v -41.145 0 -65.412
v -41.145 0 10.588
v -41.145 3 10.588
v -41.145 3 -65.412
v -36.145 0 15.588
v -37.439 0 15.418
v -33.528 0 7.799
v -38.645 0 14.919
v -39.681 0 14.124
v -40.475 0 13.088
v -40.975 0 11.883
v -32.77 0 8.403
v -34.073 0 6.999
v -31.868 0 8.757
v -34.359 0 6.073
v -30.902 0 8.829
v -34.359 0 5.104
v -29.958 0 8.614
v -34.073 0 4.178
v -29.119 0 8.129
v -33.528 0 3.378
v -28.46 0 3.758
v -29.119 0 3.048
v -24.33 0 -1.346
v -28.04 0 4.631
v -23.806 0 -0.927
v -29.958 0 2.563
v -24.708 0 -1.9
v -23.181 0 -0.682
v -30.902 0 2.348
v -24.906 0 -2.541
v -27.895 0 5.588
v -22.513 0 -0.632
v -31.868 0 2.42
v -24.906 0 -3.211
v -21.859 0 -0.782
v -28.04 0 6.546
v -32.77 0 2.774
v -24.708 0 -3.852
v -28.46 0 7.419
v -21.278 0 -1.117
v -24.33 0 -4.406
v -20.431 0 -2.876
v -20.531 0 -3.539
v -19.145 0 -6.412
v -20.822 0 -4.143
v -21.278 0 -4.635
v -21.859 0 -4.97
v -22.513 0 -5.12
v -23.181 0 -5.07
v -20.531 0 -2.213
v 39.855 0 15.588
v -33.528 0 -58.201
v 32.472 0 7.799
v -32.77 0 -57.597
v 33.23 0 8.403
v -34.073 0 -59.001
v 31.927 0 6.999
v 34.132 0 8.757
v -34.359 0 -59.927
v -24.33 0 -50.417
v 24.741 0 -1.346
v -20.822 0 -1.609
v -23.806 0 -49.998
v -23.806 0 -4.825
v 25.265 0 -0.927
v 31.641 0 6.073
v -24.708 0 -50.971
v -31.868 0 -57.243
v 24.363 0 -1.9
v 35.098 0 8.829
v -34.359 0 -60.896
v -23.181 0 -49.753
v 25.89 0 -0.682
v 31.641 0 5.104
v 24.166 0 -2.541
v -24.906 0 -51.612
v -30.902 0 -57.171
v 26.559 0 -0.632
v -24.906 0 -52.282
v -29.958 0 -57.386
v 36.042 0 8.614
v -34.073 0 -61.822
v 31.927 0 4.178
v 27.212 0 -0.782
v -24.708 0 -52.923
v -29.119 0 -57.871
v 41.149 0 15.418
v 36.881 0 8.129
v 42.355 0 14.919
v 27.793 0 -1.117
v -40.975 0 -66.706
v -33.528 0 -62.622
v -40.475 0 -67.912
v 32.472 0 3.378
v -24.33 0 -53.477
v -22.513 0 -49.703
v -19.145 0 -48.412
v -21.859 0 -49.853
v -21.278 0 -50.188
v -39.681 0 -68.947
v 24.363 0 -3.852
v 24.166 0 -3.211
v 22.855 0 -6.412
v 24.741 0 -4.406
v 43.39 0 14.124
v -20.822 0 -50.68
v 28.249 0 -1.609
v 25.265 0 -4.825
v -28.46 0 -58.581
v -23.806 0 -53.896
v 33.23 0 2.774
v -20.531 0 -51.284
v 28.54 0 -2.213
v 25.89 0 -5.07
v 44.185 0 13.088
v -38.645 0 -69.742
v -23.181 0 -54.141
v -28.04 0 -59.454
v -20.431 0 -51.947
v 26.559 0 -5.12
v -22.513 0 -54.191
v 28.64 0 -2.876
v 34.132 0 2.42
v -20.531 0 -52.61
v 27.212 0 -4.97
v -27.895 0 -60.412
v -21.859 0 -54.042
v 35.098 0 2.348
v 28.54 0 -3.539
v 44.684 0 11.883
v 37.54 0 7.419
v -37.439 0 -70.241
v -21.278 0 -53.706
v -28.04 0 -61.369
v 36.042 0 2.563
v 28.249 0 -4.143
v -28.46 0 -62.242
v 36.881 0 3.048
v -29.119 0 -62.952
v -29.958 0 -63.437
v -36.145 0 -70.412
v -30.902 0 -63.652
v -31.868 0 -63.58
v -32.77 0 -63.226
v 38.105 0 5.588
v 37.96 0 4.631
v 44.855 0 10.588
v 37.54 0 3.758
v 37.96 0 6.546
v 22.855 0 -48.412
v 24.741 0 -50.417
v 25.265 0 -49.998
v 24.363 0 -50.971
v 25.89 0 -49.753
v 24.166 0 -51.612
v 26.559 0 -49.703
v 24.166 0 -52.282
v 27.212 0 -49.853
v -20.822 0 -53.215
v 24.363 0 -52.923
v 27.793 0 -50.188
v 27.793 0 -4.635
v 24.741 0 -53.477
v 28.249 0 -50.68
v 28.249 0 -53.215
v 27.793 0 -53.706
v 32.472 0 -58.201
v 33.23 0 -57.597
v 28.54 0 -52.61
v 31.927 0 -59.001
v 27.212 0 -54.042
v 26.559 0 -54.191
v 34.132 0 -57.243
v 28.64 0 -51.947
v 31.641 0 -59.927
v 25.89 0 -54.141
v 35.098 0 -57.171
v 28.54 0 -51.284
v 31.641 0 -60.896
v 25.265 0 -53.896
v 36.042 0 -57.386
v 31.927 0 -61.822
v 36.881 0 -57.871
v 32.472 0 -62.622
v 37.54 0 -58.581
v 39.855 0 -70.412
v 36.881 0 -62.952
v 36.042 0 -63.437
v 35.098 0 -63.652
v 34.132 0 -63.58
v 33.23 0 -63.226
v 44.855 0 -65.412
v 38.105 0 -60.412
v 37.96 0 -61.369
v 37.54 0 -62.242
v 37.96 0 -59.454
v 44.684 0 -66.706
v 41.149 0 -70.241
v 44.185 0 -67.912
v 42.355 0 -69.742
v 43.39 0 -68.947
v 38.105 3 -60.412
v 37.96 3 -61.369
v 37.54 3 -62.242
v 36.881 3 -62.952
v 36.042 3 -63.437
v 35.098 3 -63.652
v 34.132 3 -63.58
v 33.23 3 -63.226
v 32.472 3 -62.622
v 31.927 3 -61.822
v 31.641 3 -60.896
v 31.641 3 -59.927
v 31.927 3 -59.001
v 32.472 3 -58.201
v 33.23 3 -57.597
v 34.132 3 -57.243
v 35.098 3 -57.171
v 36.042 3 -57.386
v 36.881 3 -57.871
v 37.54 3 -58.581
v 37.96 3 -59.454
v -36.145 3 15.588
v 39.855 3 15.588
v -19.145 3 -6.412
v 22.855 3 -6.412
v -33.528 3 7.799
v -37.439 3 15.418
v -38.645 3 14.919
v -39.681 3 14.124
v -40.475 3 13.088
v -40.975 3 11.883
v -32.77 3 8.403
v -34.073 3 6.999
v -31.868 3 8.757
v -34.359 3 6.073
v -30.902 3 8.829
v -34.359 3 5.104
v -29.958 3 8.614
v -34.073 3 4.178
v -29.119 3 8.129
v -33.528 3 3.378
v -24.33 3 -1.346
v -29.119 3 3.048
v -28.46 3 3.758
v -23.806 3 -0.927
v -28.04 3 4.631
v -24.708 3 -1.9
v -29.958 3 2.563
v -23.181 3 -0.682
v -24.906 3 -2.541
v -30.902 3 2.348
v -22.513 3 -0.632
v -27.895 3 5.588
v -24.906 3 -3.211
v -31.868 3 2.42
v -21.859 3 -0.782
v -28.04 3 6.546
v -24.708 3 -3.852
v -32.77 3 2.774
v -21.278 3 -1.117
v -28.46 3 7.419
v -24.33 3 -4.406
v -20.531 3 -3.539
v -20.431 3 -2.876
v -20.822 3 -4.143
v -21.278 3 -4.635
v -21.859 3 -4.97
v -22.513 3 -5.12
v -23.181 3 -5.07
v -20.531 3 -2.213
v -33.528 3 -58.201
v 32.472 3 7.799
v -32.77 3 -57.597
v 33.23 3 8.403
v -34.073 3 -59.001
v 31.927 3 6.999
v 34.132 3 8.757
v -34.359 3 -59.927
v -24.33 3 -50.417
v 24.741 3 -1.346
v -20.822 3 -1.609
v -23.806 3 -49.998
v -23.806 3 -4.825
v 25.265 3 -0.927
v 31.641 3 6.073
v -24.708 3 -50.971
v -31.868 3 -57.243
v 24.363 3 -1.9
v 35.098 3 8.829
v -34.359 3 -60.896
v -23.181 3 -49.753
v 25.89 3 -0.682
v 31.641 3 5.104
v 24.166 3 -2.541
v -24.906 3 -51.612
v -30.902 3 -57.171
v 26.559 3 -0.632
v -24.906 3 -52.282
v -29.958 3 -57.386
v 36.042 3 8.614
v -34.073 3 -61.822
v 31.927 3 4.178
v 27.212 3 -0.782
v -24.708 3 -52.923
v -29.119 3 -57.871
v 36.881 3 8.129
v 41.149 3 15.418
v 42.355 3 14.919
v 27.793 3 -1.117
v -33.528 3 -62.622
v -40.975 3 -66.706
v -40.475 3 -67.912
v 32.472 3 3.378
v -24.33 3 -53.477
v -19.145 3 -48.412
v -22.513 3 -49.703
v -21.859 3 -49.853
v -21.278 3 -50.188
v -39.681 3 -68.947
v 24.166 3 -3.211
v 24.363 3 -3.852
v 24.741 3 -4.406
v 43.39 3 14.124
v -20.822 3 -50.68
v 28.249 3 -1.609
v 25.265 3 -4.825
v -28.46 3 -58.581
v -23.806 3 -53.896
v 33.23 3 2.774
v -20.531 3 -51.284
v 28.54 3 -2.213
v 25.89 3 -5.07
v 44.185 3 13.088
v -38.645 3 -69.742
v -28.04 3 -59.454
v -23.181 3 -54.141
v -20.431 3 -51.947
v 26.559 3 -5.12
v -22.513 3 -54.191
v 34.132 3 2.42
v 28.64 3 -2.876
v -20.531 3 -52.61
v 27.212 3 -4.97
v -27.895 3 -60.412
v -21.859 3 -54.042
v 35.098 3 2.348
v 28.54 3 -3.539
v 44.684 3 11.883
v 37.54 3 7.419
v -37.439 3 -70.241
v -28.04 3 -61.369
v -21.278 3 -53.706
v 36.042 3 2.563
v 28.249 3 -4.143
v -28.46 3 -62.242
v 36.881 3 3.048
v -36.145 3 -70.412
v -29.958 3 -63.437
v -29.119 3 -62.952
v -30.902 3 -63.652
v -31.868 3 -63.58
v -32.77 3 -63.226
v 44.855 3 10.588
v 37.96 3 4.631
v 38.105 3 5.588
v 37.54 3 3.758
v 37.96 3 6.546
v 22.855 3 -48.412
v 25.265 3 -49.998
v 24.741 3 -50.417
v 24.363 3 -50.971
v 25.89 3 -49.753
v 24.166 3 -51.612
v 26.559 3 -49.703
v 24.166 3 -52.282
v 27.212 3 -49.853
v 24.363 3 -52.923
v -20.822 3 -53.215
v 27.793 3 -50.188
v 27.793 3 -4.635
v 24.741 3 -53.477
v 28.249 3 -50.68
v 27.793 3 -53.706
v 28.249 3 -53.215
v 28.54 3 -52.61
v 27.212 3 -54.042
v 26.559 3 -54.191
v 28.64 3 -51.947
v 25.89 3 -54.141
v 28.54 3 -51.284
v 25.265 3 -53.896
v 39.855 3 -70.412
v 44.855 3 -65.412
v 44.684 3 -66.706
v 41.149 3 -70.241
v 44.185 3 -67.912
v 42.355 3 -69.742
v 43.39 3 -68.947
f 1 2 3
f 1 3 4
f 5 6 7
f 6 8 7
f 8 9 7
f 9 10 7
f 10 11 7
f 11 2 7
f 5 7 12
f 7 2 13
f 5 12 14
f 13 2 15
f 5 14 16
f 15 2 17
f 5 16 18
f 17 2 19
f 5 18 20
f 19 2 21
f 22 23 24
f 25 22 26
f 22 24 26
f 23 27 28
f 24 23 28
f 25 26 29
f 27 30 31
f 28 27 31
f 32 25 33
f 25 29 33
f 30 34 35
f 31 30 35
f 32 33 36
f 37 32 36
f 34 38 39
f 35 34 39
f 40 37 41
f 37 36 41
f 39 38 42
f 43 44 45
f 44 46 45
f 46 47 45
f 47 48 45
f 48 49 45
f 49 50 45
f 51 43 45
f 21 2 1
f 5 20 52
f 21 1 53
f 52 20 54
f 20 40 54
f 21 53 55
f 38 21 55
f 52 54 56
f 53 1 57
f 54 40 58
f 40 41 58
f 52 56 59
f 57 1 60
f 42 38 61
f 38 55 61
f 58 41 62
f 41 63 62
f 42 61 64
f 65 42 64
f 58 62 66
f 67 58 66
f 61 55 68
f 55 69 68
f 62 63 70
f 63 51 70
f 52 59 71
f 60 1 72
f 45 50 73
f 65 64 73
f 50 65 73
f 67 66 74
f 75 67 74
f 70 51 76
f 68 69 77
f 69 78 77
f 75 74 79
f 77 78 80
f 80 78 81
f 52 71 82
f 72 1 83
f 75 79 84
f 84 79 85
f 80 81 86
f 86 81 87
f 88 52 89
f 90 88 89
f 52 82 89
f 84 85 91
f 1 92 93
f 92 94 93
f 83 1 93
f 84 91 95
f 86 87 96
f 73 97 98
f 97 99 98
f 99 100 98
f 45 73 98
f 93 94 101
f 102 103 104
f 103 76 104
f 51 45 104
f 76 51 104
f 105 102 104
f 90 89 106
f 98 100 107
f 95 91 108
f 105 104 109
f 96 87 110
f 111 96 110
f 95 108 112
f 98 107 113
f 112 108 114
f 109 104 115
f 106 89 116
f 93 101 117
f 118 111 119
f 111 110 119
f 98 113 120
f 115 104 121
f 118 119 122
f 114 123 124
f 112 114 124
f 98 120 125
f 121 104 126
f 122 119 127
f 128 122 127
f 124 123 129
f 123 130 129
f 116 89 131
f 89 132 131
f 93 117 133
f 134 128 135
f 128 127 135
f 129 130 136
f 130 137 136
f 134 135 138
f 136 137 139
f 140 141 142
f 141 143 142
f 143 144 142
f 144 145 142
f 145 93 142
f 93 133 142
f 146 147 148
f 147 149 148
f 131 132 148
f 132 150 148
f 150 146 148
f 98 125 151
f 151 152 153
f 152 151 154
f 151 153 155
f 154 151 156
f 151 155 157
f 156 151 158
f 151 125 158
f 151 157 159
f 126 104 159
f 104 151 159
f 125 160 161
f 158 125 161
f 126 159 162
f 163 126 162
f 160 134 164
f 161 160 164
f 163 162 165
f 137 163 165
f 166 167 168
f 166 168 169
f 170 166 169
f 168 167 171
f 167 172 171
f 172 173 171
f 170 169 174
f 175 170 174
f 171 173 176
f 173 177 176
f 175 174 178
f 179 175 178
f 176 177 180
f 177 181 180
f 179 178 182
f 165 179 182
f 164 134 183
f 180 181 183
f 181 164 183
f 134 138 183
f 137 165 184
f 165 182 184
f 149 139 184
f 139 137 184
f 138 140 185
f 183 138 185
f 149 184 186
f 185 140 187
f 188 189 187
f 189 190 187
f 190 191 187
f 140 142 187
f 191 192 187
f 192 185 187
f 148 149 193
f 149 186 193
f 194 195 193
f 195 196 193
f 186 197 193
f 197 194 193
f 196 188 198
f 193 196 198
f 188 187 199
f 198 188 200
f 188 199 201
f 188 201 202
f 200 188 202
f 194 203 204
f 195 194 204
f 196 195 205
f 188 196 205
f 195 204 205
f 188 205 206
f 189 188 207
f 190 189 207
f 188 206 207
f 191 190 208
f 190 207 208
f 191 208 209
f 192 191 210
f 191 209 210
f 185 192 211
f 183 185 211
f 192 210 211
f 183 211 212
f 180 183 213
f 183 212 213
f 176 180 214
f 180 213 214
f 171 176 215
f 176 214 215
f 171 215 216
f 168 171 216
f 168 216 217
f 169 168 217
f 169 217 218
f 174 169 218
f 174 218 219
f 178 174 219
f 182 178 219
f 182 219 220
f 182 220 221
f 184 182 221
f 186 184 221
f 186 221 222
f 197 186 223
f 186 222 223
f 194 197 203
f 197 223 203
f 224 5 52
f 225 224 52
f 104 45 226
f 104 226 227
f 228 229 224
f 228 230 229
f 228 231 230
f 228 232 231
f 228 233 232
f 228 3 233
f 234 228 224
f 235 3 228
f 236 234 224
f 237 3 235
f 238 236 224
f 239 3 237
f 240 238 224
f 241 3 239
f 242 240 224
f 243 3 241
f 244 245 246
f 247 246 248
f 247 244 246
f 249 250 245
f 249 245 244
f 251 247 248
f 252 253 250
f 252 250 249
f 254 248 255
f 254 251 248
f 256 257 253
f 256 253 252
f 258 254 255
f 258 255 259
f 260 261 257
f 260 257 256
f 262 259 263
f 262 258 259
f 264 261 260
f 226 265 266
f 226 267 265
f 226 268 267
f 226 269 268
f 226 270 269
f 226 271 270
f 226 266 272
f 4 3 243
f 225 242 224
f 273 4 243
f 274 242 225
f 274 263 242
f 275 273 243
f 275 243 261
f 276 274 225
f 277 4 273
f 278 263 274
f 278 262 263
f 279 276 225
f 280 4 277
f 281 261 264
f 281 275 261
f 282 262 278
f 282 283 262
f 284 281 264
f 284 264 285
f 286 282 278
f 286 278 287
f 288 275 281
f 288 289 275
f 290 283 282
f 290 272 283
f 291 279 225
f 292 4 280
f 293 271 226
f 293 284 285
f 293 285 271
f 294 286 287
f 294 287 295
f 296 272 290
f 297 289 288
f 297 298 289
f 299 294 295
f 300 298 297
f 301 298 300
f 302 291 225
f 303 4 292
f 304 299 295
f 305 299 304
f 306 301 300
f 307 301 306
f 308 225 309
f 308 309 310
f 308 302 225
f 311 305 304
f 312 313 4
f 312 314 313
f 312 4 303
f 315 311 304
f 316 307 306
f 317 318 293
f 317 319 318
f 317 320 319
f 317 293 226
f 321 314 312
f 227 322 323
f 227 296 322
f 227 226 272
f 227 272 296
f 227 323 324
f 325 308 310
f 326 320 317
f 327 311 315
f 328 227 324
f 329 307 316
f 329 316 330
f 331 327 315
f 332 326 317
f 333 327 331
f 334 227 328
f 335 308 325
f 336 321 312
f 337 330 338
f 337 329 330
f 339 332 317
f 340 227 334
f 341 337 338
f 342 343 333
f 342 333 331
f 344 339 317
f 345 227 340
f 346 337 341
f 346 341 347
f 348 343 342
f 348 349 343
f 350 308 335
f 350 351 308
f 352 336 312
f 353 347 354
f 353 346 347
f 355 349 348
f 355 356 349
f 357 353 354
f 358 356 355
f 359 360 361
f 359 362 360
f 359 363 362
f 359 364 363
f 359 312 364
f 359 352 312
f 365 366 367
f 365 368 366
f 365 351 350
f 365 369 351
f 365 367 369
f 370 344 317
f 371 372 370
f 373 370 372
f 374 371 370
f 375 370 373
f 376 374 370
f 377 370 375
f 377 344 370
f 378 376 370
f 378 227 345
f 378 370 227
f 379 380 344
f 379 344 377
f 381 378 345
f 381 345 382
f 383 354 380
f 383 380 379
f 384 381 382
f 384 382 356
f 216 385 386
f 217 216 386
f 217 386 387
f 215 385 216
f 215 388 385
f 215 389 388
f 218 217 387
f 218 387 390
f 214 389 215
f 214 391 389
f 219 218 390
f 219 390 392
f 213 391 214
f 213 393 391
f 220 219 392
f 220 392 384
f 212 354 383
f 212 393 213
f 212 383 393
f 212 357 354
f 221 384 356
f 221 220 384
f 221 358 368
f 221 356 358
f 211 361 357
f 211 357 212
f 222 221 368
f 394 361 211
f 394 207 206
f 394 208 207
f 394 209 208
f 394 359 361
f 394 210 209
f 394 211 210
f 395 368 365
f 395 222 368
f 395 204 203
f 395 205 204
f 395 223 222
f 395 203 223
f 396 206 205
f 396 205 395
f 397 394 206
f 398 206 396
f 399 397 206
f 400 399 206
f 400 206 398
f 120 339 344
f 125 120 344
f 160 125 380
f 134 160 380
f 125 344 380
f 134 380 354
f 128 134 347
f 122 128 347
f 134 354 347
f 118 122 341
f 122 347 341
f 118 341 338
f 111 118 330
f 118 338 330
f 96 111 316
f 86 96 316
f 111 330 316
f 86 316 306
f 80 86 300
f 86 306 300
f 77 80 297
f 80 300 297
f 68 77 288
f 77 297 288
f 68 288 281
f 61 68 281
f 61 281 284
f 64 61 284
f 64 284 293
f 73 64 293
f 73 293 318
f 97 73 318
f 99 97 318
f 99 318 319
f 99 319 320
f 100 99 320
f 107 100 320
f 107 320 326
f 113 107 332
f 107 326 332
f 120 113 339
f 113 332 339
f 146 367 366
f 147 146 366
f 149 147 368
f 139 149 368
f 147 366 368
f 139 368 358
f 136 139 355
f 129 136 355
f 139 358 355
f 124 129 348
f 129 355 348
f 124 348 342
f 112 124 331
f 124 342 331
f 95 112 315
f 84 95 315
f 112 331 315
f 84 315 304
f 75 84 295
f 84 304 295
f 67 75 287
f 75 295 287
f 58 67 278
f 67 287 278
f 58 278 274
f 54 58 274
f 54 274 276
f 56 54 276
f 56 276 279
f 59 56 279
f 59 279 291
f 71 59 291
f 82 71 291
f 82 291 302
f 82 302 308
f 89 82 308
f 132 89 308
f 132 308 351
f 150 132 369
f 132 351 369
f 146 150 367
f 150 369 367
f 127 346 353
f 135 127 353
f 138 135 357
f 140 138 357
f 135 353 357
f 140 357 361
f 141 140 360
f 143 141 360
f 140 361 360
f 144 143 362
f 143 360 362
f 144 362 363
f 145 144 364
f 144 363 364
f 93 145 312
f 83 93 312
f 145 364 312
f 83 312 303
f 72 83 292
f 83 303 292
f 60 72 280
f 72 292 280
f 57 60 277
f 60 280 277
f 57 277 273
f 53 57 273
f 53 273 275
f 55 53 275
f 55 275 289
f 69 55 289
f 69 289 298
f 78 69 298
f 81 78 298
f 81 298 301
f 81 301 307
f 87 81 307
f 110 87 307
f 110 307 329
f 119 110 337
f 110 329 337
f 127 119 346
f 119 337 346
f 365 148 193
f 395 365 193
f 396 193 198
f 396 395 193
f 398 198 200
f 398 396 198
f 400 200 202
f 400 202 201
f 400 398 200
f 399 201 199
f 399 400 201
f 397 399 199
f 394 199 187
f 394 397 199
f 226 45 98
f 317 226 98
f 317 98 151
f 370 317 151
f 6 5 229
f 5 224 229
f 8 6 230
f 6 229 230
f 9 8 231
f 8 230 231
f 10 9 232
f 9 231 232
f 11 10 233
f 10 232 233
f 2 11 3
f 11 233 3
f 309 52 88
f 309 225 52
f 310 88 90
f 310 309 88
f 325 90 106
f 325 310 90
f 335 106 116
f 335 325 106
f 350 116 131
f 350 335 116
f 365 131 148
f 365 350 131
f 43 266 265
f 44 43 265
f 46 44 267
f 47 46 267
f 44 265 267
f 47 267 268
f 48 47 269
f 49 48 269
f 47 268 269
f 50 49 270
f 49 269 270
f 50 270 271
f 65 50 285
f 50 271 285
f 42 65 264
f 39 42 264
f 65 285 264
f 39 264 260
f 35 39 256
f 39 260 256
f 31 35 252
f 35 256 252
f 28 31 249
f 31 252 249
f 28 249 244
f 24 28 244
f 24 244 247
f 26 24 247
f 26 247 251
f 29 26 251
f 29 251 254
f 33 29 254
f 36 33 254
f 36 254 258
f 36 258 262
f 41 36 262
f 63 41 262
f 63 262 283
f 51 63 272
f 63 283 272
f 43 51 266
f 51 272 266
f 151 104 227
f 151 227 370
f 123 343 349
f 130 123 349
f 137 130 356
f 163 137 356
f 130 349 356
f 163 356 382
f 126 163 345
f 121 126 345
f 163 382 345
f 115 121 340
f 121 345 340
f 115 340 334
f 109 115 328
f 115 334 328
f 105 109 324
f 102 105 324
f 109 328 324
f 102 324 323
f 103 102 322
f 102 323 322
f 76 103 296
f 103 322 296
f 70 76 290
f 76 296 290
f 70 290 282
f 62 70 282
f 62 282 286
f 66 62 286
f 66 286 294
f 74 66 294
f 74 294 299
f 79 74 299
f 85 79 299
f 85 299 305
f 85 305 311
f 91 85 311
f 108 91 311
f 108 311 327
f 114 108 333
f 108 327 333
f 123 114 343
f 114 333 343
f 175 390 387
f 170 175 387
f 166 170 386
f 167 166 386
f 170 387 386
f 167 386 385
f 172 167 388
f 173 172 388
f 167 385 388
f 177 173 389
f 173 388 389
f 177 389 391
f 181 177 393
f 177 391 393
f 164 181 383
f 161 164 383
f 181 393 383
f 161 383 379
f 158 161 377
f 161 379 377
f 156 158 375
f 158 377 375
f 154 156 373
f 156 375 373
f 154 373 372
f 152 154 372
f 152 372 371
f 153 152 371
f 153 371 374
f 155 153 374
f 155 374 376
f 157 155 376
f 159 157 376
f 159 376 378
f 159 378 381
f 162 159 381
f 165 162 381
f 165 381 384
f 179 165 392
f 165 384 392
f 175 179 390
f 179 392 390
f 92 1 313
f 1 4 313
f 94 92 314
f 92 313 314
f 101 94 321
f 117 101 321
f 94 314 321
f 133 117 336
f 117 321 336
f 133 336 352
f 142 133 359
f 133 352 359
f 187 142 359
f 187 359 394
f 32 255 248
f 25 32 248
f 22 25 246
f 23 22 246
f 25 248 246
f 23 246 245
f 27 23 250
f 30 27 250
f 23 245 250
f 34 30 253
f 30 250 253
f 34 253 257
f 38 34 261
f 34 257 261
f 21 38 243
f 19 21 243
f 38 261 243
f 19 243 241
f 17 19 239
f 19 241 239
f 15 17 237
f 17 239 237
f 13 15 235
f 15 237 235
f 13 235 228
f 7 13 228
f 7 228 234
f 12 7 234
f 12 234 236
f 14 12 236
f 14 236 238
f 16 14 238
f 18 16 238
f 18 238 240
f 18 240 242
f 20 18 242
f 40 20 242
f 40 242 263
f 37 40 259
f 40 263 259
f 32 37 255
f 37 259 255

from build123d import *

# Parameters (mm, degrees)
SKETCH2_W           = 86
SKETCH2_H           = 86
SKETCH2_W_2         = 42
SKETCH2_H_2         = 42
BOSS_EXTRUDE1_DEPTH = 3
SKETCH3_R           = 3.25
CUT_EXTRUDE1_DEPTH  = 3
SKETCH7_R           = 2.25
CUT_EXTRUDE2_DEPTH  = 3
FILLET1_R           = 5
FILLET2_R           = 5
FILLET3_R           = 5
FILLET4_R           = 5


with BuildPart() as part:
    # Sketch2 → Boss-Extrude1 (new body)
    with BuildSketch(Plane(origin=(0, 0, 0), x_dir=(1, 0, 0), z_dir=(0, 1, 0))):
        with Locations((1.854851242, 27.411515707)):
            Rectangle(SKETCH2_W, SKETCH2_H)
        with Locations((1.854851242, 27.411515707)):
            Rectangle(SKETCH2_W_2, SKETCH2_H_2, mode=Mode.SUBTRACT)
    extrude(amount=BOSS_EXTRUDE1_DEPTH)

    # Sketch3 → Cut-Extrude1 (cut)
    with BuildSketch(Plane(origin=(0, 3, 0), x_dir=(1, 0, 0), z_dir=(0, 1, 0))):
        with Locations((34.854851242, -5.588484293)):
            Circle(SKETCH3_R)
        with Locations((-31.145148758, -5.588484293)):
            Circle(SKETCH3_R)
        with Locations((-31.145148758, 60.411515707)):
            Circle(SKETCH3_R)
        with Locations((34.854851242, 60.411515707)):
            Circle(SKETCH3_R)
    extrude(amount=-CUT_EXTRUDE1_DEPTH, mode=Mode.SUBTRACT)

    # Sketch7 → Cut-Extrude2 (cut)
    with BuildSketch(Plane(origin=(0, 3, 0), x_dir=(1, 0, 0), z_dir=(0, 1, 0))):
        with Locations((26.390385148, 2.875981801)):
            Circle(SKETCH7_R)
        with Locations((-22.680682664, 2.875981801)):
            Circle(SKETCH7_R)
        with Locations((-22.680682664, 51.947049613)):
            Circle(SKETCH7_R)
        with Locations((26.390385148, 51.947049613)):
            Circle(SKETCH7_R)
    extrude(amount=-CUT_EXTRUDE2_DEPTH, mode=Mode.SUBTRACT)

    # Fillet1
    fillet1_edges = [part.edges().sort_by_distance(p)[0] for p in [
        (-41.145148758, 1.5, -70.411515707),
    ]]
    fillet(fillet1_edges, radius=FILLET1_R)

    # Fillet2
    fillet2_edges = [part.edges().sort_by_distance(p)[0] for p in [
        (44.854851242, 1.5, 15.588484293),
    ]]
    fillet(fillet2_edges, radius=FILLET2_R)

    # Fillet3
    fillet3_edges = [part.edges().sort_by_distance(p)[0] for p in [
        (-41.145148758, 1.5, 15.588484293),
    ]]
    fillet(fillet3_edges, radius=FILLET3_R)

    # Fillet4
    fillet4_edges = [part.edges().sort_by_distance(p)[0] for p in [
        (44.854851242, 1.5, -70.411515707),
    ]]
    fillet(fillet4_edges, radius=FILLET4_R)


solid = part.part
